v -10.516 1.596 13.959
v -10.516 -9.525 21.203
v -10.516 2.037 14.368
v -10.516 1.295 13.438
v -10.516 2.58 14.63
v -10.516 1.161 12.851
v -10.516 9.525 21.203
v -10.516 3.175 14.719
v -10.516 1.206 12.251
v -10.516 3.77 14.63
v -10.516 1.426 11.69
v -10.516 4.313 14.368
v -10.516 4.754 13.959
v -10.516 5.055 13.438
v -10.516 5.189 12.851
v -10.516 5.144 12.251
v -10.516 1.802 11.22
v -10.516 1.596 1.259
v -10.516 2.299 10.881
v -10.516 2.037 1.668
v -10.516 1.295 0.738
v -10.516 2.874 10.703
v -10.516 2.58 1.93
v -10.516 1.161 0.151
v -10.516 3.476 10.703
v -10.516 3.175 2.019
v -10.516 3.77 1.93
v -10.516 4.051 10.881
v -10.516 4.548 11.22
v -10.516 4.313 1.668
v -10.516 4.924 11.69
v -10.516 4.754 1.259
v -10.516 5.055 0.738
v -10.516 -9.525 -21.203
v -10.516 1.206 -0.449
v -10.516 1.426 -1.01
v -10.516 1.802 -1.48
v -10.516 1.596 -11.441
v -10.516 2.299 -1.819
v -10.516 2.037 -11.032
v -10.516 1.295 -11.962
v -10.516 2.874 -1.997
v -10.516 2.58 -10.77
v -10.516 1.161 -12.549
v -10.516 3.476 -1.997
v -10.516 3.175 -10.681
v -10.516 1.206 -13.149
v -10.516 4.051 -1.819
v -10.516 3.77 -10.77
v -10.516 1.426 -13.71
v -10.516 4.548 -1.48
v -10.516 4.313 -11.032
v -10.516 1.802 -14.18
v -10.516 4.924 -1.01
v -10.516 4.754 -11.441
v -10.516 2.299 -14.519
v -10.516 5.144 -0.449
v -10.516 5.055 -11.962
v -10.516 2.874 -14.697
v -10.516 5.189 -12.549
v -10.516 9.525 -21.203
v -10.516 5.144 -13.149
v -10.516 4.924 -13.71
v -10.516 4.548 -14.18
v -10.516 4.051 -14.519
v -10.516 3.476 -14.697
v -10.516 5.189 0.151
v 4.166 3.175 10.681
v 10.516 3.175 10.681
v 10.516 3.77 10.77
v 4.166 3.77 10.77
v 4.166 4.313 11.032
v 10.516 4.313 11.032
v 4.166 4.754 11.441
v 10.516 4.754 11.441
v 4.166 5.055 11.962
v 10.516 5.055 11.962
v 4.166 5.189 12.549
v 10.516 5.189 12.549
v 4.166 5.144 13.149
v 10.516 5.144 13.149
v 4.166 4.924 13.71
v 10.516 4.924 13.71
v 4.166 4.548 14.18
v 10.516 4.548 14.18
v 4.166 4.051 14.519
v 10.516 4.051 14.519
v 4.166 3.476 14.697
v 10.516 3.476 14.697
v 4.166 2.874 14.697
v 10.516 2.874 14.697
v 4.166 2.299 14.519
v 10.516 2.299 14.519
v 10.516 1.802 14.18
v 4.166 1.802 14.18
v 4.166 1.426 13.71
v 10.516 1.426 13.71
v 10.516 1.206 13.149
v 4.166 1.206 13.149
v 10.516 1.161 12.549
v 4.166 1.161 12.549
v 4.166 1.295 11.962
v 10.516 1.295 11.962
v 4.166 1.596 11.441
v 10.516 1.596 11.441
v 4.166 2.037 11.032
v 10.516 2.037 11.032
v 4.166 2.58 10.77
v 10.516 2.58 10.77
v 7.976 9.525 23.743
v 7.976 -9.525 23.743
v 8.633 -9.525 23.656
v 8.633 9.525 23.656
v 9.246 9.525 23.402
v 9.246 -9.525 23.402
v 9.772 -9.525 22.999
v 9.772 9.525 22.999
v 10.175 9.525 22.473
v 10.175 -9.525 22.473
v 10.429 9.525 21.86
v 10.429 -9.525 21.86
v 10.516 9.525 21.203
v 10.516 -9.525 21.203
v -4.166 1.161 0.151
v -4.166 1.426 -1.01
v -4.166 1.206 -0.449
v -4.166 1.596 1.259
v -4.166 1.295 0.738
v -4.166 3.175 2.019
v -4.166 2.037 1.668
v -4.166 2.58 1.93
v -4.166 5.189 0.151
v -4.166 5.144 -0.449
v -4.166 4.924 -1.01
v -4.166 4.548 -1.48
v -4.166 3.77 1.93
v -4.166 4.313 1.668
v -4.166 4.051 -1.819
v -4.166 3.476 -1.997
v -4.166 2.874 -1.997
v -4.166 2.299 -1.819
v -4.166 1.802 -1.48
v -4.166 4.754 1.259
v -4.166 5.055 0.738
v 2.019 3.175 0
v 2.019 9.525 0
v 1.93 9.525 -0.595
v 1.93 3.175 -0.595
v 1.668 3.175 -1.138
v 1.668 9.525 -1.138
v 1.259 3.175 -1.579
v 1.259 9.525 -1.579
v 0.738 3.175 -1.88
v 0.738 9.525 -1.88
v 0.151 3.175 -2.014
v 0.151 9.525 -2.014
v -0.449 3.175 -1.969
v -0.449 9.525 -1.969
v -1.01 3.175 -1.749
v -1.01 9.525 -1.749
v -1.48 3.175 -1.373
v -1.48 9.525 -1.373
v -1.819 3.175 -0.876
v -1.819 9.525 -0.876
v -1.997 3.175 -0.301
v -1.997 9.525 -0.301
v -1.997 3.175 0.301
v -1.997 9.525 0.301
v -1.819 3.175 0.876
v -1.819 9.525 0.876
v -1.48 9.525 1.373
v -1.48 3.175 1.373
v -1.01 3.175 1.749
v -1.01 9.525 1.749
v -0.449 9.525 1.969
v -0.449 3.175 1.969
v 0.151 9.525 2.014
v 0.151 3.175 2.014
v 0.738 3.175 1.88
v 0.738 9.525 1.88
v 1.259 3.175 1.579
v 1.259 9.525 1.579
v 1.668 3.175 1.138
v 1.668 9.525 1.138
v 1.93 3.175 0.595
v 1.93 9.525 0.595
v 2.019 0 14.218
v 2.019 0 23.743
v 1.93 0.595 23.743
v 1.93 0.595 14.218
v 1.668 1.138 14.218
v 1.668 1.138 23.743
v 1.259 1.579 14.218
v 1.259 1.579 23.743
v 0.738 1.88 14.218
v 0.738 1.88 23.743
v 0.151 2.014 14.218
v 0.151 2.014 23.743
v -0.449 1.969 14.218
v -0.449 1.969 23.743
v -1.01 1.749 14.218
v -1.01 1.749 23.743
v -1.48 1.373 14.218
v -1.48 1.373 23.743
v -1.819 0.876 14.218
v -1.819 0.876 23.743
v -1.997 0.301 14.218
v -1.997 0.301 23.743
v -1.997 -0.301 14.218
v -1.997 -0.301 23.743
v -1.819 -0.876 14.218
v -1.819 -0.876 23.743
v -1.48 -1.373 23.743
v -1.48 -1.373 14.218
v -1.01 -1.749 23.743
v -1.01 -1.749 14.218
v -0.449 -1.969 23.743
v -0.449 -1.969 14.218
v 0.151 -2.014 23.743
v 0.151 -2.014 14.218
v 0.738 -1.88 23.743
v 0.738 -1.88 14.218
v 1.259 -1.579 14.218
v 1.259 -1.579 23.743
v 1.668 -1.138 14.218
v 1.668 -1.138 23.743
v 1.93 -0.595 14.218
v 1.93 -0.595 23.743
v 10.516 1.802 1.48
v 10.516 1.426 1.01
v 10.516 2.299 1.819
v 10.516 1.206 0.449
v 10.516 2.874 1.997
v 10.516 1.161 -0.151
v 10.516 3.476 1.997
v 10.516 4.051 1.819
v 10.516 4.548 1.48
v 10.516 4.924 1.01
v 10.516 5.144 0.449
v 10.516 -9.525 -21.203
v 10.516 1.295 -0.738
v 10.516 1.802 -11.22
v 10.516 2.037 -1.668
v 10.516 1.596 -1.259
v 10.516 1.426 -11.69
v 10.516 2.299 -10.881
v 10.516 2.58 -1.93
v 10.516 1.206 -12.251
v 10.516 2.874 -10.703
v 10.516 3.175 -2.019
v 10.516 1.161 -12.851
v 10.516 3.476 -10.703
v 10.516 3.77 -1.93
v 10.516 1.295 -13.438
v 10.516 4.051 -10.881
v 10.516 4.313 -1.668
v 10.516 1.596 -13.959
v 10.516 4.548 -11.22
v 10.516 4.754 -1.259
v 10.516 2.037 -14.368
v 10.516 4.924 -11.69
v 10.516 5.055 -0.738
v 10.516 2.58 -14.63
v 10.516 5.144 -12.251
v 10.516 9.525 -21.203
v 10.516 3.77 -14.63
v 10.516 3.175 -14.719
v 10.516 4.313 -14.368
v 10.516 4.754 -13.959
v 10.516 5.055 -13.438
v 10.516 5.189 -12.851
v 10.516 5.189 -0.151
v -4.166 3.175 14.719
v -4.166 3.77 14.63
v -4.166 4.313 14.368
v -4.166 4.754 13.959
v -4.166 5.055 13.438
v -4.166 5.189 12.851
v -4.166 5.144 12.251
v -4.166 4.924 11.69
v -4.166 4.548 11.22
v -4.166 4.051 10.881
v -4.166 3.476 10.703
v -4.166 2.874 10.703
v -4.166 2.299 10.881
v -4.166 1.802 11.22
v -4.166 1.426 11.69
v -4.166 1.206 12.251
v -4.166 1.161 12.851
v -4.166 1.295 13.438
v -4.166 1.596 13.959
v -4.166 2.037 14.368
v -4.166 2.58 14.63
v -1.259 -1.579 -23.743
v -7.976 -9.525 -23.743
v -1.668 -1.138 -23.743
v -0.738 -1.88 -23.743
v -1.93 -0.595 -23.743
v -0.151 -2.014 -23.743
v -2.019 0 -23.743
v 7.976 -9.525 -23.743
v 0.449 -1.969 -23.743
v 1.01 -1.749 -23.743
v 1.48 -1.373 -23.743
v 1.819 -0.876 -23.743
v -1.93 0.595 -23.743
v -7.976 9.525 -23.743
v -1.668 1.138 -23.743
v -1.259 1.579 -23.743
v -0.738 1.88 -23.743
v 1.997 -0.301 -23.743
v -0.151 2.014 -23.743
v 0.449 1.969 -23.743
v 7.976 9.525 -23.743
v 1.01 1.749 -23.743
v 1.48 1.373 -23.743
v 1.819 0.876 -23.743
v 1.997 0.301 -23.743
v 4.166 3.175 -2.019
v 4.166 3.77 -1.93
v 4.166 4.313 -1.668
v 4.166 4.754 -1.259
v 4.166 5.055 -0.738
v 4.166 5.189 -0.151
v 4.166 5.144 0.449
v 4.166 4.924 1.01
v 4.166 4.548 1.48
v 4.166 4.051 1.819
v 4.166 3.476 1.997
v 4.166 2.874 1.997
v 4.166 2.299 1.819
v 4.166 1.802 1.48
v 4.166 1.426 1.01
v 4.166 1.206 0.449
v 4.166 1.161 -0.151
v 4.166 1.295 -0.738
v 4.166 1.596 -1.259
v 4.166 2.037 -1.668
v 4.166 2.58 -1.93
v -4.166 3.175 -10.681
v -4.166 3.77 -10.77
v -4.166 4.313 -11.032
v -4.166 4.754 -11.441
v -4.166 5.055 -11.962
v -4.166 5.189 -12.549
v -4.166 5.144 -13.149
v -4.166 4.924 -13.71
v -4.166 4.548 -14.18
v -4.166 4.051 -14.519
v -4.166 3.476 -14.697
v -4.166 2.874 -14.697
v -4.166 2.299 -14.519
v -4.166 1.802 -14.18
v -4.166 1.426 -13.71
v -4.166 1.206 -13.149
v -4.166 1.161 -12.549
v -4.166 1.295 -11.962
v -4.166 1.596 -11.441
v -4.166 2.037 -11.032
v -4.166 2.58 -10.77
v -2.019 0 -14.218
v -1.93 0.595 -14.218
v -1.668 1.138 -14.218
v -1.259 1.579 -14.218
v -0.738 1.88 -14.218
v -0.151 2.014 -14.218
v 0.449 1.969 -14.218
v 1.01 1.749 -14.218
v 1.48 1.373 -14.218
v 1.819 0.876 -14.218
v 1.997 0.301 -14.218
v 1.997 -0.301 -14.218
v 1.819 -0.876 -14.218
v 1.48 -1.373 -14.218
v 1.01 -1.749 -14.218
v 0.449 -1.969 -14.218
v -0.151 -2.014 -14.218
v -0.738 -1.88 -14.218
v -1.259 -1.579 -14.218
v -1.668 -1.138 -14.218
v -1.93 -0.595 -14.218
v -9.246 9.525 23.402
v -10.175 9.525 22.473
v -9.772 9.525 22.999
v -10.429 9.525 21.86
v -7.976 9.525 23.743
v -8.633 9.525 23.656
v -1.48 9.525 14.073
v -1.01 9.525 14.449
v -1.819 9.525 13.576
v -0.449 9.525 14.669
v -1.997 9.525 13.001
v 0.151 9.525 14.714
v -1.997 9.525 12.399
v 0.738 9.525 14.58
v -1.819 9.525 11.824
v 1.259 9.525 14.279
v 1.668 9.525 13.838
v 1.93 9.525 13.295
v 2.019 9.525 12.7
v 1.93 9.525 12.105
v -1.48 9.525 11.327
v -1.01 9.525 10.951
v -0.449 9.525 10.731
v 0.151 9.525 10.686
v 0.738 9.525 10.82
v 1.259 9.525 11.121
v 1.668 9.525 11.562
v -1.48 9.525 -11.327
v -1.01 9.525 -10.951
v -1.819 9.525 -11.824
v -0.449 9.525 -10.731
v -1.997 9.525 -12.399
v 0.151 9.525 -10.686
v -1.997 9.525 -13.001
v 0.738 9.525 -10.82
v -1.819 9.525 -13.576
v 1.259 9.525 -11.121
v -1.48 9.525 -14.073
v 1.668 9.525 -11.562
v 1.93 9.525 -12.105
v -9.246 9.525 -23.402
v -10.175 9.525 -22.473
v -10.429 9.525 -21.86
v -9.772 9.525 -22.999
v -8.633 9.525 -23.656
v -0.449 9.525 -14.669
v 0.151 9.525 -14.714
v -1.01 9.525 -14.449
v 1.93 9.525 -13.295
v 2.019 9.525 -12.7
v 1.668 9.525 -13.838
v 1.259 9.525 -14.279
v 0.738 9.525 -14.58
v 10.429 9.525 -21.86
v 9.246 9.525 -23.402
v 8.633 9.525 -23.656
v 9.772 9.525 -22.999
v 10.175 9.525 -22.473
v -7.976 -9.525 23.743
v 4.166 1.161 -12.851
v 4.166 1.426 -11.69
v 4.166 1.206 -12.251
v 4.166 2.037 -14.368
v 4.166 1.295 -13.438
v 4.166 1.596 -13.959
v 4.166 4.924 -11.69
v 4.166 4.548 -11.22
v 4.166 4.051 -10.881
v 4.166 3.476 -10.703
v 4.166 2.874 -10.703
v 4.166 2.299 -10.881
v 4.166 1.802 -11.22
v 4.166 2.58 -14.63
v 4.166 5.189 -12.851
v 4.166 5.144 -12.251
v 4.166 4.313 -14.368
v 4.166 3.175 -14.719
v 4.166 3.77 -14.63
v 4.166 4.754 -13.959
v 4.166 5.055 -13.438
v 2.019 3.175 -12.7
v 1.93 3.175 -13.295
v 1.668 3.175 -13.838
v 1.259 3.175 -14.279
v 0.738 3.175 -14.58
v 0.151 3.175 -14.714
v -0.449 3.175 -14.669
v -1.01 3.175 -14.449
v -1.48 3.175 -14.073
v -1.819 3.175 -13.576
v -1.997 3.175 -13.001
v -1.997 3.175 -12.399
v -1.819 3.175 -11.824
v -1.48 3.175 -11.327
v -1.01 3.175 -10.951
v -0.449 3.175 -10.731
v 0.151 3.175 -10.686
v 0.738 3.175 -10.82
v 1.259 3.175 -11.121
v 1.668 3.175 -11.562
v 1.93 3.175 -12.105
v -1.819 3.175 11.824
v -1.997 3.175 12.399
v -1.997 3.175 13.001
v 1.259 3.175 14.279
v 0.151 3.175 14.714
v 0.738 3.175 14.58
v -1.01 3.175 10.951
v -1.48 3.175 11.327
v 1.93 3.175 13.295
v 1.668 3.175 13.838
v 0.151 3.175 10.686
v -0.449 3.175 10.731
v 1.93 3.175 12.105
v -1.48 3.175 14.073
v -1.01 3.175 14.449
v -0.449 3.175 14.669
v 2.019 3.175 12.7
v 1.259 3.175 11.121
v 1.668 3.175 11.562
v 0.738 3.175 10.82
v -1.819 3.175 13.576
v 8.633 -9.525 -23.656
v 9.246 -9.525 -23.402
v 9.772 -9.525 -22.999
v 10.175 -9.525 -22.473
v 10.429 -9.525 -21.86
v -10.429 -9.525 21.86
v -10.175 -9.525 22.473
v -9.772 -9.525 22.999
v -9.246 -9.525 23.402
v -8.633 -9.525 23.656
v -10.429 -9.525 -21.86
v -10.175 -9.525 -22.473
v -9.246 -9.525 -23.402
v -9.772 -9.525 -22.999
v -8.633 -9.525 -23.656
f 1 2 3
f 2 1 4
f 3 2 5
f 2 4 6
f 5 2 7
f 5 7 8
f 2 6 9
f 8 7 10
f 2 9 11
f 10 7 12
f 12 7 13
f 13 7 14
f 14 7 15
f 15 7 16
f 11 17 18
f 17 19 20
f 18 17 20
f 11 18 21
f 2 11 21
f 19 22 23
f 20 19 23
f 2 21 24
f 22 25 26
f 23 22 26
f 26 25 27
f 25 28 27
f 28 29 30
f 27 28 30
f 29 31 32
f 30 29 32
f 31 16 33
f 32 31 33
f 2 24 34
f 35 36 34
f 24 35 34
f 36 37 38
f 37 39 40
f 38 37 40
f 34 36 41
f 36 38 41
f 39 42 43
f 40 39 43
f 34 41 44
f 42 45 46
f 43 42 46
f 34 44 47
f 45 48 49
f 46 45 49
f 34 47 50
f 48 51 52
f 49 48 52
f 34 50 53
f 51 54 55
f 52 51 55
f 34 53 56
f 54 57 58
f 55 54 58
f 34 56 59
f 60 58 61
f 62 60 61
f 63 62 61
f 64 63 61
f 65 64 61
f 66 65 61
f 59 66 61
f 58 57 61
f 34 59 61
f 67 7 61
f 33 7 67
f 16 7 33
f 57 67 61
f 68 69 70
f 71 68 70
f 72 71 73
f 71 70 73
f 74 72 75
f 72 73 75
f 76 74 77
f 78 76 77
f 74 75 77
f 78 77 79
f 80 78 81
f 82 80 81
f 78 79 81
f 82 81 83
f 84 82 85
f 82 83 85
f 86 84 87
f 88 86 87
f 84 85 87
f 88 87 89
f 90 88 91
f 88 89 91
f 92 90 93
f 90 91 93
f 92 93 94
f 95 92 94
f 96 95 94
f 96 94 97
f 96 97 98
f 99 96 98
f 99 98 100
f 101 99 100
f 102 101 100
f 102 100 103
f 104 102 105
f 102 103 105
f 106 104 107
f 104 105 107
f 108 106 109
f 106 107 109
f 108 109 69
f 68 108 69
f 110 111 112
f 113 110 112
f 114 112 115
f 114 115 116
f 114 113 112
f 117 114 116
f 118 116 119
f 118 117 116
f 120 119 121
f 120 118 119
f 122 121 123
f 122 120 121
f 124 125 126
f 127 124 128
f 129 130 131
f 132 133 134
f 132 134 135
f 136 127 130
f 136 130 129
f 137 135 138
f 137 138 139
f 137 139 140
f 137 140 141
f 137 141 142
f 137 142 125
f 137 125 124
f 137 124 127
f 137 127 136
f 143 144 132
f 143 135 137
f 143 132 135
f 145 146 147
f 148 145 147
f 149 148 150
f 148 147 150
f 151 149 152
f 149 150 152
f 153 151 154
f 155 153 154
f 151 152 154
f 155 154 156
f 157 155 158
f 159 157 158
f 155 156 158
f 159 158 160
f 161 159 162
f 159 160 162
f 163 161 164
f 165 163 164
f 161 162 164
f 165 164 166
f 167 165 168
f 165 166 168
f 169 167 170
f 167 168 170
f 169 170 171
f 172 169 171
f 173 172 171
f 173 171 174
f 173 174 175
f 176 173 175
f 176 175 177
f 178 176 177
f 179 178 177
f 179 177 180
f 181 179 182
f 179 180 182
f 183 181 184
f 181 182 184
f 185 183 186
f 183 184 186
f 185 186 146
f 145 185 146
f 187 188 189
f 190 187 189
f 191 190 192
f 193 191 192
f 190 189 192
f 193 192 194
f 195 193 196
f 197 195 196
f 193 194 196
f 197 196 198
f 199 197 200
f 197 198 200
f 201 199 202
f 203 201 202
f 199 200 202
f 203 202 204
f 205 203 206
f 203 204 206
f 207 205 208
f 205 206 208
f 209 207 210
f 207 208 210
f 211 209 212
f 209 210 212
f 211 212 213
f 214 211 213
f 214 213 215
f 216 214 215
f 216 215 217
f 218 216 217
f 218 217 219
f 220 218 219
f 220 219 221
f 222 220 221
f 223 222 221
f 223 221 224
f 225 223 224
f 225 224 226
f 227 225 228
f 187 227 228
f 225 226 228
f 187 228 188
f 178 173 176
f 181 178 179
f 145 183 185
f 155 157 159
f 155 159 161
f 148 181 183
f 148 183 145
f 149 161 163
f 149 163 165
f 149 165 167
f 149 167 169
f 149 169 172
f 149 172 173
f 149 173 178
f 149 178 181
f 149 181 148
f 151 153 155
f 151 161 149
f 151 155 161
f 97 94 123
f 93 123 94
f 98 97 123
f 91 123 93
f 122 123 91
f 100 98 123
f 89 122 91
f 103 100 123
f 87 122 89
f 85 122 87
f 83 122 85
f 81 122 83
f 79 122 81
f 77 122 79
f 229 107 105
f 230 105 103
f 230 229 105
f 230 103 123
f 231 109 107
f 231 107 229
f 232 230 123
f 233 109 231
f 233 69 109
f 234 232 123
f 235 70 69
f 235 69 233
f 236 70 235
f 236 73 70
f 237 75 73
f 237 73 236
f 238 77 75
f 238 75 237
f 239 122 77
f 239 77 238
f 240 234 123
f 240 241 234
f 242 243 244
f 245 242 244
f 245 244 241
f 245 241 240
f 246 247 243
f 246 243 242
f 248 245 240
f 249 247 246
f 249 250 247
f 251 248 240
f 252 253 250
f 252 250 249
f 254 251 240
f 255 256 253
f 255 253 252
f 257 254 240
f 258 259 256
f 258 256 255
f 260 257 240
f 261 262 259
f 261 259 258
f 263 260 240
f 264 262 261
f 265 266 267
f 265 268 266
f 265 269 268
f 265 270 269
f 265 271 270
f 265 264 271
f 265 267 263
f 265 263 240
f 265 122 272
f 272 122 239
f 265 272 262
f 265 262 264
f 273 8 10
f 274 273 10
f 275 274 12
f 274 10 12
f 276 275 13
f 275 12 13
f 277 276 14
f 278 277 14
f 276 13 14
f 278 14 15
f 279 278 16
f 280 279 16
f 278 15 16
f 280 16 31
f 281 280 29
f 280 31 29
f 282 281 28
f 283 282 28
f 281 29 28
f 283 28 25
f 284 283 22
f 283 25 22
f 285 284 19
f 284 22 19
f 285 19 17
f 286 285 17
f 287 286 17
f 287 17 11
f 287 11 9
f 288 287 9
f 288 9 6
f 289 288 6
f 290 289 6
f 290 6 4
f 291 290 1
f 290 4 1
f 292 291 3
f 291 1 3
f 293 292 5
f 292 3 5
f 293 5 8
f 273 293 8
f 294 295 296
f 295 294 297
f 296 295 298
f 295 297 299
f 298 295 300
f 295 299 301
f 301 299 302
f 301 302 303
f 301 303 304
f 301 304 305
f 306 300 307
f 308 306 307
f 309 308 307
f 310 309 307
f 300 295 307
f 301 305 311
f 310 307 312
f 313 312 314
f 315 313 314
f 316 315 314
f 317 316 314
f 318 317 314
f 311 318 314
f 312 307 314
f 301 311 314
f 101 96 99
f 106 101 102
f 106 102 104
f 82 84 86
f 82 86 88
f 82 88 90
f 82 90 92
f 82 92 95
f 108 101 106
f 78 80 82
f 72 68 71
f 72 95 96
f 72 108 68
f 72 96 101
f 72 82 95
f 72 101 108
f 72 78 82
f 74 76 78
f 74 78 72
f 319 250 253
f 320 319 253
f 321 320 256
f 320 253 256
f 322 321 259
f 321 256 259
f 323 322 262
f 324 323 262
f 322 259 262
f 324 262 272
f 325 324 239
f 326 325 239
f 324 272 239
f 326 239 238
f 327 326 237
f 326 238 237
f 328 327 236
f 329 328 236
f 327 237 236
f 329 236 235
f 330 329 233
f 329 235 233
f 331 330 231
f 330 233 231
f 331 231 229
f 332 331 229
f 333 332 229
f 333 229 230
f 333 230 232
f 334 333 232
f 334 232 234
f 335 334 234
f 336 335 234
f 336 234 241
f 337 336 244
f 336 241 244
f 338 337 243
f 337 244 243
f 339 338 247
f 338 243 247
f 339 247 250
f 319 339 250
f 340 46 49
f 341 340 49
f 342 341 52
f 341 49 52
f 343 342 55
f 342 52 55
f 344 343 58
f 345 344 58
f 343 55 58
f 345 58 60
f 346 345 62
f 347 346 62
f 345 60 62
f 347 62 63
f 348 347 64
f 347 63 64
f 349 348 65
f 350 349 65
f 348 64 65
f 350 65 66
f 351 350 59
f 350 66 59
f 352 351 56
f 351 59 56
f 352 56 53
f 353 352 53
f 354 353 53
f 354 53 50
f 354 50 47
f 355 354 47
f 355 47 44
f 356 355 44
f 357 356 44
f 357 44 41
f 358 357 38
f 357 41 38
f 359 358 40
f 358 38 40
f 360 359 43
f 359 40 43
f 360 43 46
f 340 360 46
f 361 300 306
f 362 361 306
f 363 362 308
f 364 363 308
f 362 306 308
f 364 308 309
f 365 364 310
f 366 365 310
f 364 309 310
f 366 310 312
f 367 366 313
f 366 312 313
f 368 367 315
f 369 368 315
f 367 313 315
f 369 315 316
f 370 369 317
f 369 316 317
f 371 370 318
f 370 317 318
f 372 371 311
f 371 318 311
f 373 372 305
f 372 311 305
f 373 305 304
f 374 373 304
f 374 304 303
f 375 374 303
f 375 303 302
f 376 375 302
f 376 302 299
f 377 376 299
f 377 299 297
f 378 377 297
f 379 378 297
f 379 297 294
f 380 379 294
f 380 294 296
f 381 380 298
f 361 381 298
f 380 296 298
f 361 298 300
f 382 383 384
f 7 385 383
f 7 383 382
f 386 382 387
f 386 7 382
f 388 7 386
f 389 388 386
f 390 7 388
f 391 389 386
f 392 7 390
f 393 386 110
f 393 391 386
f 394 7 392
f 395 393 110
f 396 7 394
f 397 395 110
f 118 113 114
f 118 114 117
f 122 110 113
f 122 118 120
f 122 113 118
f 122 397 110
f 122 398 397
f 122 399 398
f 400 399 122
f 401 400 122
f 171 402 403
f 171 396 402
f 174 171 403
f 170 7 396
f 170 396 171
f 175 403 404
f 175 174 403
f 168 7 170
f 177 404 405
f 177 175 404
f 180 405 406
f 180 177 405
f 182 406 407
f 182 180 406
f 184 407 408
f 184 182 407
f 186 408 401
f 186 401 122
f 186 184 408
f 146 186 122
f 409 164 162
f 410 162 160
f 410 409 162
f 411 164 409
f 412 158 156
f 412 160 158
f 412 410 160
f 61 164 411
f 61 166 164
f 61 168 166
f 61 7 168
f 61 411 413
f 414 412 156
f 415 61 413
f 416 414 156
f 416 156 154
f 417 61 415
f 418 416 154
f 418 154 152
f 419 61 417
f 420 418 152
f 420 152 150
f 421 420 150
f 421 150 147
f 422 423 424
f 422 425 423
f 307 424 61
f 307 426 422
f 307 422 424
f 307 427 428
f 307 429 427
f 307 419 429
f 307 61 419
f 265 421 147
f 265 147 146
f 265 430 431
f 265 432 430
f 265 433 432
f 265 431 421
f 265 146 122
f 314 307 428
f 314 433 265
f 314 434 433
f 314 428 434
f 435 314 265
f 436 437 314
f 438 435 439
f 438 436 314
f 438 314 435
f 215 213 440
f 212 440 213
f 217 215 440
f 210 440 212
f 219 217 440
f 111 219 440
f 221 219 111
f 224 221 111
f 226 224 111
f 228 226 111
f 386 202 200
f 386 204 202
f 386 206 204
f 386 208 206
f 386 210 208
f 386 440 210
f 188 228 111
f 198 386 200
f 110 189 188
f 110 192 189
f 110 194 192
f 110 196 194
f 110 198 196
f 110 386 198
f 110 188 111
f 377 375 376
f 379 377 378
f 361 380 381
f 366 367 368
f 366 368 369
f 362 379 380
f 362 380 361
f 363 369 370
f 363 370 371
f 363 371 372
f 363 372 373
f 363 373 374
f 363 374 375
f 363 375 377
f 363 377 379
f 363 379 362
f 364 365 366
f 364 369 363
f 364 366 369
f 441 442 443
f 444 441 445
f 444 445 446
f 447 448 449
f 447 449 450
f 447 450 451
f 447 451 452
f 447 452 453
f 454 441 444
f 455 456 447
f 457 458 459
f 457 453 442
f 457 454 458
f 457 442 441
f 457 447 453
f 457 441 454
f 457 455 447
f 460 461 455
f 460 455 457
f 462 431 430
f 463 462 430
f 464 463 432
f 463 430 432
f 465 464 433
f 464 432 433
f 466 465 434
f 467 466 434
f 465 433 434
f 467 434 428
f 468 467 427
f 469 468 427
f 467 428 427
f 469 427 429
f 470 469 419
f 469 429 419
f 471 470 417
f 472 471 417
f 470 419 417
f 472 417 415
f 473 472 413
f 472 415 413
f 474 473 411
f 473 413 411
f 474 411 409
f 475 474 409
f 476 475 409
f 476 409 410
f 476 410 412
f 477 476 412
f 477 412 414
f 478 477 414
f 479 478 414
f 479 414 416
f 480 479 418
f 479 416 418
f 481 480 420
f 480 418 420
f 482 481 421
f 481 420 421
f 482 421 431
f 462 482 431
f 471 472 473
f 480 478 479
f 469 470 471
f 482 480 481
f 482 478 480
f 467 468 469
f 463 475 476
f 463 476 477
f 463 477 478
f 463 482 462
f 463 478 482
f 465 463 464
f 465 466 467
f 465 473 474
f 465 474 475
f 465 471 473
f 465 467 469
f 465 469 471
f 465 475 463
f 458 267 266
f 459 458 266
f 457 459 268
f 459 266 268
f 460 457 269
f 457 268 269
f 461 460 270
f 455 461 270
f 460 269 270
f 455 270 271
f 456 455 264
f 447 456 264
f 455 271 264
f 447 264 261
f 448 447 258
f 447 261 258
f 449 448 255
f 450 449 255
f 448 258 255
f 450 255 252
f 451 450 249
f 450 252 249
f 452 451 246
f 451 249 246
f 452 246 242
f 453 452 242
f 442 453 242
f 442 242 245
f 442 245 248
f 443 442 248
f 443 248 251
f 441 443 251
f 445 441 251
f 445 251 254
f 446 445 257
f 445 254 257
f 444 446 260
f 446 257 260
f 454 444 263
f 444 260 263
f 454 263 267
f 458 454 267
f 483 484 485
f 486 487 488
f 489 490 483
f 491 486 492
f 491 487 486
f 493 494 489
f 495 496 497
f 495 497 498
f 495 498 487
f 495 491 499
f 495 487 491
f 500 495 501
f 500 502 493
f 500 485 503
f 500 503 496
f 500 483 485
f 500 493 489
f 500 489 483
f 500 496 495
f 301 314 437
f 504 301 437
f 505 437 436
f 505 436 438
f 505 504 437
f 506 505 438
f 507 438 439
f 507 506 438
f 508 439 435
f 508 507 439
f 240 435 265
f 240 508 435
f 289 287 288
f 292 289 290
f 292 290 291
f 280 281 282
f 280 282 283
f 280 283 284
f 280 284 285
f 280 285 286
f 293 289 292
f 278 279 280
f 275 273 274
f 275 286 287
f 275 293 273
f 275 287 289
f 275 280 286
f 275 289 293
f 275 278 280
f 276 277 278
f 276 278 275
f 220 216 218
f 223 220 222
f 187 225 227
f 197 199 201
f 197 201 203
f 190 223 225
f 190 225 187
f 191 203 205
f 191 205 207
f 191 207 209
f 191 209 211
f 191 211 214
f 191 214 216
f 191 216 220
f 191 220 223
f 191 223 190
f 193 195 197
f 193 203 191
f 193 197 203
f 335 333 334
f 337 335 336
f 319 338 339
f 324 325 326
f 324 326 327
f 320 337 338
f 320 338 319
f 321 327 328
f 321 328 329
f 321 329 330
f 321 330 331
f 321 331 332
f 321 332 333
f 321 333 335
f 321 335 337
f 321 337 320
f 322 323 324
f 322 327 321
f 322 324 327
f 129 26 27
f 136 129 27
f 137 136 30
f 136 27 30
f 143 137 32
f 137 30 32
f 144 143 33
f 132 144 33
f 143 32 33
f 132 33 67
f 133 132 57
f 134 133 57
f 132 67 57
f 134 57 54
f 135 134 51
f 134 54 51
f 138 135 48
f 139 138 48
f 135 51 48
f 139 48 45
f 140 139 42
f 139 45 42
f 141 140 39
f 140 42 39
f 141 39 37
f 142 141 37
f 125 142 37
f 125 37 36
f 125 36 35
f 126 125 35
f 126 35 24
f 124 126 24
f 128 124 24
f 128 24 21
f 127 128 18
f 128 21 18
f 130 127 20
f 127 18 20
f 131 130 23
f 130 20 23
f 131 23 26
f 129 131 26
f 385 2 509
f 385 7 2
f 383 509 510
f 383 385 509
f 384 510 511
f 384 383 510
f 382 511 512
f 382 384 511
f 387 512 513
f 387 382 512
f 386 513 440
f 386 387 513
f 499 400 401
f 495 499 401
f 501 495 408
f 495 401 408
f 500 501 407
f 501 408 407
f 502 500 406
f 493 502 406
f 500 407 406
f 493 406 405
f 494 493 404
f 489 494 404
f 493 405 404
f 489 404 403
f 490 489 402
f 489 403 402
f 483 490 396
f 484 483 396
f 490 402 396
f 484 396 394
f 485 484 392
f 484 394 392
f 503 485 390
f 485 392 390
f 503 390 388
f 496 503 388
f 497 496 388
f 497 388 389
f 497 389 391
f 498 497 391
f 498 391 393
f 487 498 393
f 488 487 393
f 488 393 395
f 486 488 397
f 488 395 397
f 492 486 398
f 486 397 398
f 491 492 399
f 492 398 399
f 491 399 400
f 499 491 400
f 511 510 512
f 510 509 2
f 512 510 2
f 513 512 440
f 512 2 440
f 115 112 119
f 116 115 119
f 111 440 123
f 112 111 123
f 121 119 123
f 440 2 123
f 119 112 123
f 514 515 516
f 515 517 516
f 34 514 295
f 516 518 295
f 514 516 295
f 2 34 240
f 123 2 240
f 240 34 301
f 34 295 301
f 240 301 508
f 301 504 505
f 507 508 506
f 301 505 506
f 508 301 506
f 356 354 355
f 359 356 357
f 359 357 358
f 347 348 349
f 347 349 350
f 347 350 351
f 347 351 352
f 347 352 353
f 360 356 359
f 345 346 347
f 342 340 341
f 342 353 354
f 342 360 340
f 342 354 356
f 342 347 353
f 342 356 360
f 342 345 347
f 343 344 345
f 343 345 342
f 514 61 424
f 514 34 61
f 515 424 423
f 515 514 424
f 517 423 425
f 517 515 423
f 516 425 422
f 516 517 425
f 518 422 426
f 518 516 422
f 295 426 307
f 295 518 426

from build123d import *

# Parameters (mm, degrees)
SKETCH1_W           = 21.0312
SKETCH1_H           = 47.4853
BOSS_EXTRUDE1_DEPTH = 9.525
SKETCH2_R           = 2.0193
CUT_EXTRUDE1_DEPTH  = 9.525
SKETCH3_R           = 2.0193
CUT_EXTRUDE2_DEPTH  = 9.525
SKETCH4_R           = 2.0193
CUT_EXTRUDE3_DEPTH  = 6.35
SKETCH5_R           = 2.0193
CUT_EXTRUDE4_DEPTH  = 6.35
SKETCH6_R           = 2.0193
CUT_EXTRUDE5_DEPTH  = 6.35
FILLET1_R           = 2.54


with BuildPart() as part:
    # Sketch1 → Boss-Extrude1 (new body, symmetric)
    with BuildSketch(Plane(origin=(0, 0, 0), x_dir=(1, 0, 0), z_dir=(0, 1, 0))):
        Rectangle(SKETCH1_W, SKETCH1_H)
    extrude(amount=BOSS_EXTRUDE1_DEPTH, both=True)

    # Sketch2 → Cut-Extrude1 (cut)
    with BuildSketch(Plane.XY.offset(23.74265)):
        Circle(SKETCH2_R)
    extrude(amount=-CUT_EXTRUDE1_DEPTH, mode=Mode.SUBTRACT)

    # Sketch3 → Cut-Extrude2 (cut)
    with BuildSketch(Plane(origin=(0, 0, -23.74265), x_dir=(-1, 0, 0), z_dir=(0, 0, -1))):
        Circle(SKETCH3_R)
    extrude(amount=-CUT_EXTRUDE2_DEPTH, mode=Mode.SUBTRACT)

    # Sketch4 → Cut-Extrude3 (cut)
    with BuildSketch(Plane(origin=(10.5156, 0, 0), x_dir=(0, 0, -1), z_dir=(1, 0, 0))):
        with Locations((-12.7, 3.175)):
            Circle(SKETCH4_R)
        with Locations((12.7, 3.175)):
            Circle(SKETCH4_R)
        with Locations((0, 3.175)):
            Circle(SKETCH4_R)
    extrude(amount=-CUT_EXTRUDE3_DEPTH, mode=Mode.SUBTRACT)

    # Sketch5 → Cut-Extrude4 (cut)
    with BuildSketch(Plane.ZY.offset(10.5156)):
        with Locations((-12.7, 3.175)):
            Circle(SKETCH5_R)
        with Locations((0, 3.175)):
            Circle(SKETCH5_R)
        with Locations((12.7, 3.175)):
            Circle(SKETCH5_R)
    extrude(amount=-CUT_EXTRUDE4_DEPTH, mode=Mode.SUBTRACT)

    # Sketch6 → Cut-Extrude5 (cut)
    with BuildSketch(Plane(origin=(0, 9.525, 0), x_dir=(1, 0, 0), z_dir=(0, 1, 0))):
        with Locations((0, 12.7)):
            Circle(SKETCH6_R)
        Circle(SKETCH6_R)
        with Locations((0, -12.7)):
            Circle(SKETCH6_R)
    extrude(amount=-CUT_EXTRUDE5_DEPTH, mode=Mode.SUBTRACT)

    # Fillet1
    fillet1_edges = [part.edges().sort_by_distance(p)[0] for p in [
        (10.5156, 0, 23.74265),
        (-10.5156, 0, 23.74265),
        (-10.5156, 0, -23.74265),
        (10.5156, 0, -23.74265),
    ]]
    fillet(fillet1_edges, radius=FILLET1_R)


solid = part.part
